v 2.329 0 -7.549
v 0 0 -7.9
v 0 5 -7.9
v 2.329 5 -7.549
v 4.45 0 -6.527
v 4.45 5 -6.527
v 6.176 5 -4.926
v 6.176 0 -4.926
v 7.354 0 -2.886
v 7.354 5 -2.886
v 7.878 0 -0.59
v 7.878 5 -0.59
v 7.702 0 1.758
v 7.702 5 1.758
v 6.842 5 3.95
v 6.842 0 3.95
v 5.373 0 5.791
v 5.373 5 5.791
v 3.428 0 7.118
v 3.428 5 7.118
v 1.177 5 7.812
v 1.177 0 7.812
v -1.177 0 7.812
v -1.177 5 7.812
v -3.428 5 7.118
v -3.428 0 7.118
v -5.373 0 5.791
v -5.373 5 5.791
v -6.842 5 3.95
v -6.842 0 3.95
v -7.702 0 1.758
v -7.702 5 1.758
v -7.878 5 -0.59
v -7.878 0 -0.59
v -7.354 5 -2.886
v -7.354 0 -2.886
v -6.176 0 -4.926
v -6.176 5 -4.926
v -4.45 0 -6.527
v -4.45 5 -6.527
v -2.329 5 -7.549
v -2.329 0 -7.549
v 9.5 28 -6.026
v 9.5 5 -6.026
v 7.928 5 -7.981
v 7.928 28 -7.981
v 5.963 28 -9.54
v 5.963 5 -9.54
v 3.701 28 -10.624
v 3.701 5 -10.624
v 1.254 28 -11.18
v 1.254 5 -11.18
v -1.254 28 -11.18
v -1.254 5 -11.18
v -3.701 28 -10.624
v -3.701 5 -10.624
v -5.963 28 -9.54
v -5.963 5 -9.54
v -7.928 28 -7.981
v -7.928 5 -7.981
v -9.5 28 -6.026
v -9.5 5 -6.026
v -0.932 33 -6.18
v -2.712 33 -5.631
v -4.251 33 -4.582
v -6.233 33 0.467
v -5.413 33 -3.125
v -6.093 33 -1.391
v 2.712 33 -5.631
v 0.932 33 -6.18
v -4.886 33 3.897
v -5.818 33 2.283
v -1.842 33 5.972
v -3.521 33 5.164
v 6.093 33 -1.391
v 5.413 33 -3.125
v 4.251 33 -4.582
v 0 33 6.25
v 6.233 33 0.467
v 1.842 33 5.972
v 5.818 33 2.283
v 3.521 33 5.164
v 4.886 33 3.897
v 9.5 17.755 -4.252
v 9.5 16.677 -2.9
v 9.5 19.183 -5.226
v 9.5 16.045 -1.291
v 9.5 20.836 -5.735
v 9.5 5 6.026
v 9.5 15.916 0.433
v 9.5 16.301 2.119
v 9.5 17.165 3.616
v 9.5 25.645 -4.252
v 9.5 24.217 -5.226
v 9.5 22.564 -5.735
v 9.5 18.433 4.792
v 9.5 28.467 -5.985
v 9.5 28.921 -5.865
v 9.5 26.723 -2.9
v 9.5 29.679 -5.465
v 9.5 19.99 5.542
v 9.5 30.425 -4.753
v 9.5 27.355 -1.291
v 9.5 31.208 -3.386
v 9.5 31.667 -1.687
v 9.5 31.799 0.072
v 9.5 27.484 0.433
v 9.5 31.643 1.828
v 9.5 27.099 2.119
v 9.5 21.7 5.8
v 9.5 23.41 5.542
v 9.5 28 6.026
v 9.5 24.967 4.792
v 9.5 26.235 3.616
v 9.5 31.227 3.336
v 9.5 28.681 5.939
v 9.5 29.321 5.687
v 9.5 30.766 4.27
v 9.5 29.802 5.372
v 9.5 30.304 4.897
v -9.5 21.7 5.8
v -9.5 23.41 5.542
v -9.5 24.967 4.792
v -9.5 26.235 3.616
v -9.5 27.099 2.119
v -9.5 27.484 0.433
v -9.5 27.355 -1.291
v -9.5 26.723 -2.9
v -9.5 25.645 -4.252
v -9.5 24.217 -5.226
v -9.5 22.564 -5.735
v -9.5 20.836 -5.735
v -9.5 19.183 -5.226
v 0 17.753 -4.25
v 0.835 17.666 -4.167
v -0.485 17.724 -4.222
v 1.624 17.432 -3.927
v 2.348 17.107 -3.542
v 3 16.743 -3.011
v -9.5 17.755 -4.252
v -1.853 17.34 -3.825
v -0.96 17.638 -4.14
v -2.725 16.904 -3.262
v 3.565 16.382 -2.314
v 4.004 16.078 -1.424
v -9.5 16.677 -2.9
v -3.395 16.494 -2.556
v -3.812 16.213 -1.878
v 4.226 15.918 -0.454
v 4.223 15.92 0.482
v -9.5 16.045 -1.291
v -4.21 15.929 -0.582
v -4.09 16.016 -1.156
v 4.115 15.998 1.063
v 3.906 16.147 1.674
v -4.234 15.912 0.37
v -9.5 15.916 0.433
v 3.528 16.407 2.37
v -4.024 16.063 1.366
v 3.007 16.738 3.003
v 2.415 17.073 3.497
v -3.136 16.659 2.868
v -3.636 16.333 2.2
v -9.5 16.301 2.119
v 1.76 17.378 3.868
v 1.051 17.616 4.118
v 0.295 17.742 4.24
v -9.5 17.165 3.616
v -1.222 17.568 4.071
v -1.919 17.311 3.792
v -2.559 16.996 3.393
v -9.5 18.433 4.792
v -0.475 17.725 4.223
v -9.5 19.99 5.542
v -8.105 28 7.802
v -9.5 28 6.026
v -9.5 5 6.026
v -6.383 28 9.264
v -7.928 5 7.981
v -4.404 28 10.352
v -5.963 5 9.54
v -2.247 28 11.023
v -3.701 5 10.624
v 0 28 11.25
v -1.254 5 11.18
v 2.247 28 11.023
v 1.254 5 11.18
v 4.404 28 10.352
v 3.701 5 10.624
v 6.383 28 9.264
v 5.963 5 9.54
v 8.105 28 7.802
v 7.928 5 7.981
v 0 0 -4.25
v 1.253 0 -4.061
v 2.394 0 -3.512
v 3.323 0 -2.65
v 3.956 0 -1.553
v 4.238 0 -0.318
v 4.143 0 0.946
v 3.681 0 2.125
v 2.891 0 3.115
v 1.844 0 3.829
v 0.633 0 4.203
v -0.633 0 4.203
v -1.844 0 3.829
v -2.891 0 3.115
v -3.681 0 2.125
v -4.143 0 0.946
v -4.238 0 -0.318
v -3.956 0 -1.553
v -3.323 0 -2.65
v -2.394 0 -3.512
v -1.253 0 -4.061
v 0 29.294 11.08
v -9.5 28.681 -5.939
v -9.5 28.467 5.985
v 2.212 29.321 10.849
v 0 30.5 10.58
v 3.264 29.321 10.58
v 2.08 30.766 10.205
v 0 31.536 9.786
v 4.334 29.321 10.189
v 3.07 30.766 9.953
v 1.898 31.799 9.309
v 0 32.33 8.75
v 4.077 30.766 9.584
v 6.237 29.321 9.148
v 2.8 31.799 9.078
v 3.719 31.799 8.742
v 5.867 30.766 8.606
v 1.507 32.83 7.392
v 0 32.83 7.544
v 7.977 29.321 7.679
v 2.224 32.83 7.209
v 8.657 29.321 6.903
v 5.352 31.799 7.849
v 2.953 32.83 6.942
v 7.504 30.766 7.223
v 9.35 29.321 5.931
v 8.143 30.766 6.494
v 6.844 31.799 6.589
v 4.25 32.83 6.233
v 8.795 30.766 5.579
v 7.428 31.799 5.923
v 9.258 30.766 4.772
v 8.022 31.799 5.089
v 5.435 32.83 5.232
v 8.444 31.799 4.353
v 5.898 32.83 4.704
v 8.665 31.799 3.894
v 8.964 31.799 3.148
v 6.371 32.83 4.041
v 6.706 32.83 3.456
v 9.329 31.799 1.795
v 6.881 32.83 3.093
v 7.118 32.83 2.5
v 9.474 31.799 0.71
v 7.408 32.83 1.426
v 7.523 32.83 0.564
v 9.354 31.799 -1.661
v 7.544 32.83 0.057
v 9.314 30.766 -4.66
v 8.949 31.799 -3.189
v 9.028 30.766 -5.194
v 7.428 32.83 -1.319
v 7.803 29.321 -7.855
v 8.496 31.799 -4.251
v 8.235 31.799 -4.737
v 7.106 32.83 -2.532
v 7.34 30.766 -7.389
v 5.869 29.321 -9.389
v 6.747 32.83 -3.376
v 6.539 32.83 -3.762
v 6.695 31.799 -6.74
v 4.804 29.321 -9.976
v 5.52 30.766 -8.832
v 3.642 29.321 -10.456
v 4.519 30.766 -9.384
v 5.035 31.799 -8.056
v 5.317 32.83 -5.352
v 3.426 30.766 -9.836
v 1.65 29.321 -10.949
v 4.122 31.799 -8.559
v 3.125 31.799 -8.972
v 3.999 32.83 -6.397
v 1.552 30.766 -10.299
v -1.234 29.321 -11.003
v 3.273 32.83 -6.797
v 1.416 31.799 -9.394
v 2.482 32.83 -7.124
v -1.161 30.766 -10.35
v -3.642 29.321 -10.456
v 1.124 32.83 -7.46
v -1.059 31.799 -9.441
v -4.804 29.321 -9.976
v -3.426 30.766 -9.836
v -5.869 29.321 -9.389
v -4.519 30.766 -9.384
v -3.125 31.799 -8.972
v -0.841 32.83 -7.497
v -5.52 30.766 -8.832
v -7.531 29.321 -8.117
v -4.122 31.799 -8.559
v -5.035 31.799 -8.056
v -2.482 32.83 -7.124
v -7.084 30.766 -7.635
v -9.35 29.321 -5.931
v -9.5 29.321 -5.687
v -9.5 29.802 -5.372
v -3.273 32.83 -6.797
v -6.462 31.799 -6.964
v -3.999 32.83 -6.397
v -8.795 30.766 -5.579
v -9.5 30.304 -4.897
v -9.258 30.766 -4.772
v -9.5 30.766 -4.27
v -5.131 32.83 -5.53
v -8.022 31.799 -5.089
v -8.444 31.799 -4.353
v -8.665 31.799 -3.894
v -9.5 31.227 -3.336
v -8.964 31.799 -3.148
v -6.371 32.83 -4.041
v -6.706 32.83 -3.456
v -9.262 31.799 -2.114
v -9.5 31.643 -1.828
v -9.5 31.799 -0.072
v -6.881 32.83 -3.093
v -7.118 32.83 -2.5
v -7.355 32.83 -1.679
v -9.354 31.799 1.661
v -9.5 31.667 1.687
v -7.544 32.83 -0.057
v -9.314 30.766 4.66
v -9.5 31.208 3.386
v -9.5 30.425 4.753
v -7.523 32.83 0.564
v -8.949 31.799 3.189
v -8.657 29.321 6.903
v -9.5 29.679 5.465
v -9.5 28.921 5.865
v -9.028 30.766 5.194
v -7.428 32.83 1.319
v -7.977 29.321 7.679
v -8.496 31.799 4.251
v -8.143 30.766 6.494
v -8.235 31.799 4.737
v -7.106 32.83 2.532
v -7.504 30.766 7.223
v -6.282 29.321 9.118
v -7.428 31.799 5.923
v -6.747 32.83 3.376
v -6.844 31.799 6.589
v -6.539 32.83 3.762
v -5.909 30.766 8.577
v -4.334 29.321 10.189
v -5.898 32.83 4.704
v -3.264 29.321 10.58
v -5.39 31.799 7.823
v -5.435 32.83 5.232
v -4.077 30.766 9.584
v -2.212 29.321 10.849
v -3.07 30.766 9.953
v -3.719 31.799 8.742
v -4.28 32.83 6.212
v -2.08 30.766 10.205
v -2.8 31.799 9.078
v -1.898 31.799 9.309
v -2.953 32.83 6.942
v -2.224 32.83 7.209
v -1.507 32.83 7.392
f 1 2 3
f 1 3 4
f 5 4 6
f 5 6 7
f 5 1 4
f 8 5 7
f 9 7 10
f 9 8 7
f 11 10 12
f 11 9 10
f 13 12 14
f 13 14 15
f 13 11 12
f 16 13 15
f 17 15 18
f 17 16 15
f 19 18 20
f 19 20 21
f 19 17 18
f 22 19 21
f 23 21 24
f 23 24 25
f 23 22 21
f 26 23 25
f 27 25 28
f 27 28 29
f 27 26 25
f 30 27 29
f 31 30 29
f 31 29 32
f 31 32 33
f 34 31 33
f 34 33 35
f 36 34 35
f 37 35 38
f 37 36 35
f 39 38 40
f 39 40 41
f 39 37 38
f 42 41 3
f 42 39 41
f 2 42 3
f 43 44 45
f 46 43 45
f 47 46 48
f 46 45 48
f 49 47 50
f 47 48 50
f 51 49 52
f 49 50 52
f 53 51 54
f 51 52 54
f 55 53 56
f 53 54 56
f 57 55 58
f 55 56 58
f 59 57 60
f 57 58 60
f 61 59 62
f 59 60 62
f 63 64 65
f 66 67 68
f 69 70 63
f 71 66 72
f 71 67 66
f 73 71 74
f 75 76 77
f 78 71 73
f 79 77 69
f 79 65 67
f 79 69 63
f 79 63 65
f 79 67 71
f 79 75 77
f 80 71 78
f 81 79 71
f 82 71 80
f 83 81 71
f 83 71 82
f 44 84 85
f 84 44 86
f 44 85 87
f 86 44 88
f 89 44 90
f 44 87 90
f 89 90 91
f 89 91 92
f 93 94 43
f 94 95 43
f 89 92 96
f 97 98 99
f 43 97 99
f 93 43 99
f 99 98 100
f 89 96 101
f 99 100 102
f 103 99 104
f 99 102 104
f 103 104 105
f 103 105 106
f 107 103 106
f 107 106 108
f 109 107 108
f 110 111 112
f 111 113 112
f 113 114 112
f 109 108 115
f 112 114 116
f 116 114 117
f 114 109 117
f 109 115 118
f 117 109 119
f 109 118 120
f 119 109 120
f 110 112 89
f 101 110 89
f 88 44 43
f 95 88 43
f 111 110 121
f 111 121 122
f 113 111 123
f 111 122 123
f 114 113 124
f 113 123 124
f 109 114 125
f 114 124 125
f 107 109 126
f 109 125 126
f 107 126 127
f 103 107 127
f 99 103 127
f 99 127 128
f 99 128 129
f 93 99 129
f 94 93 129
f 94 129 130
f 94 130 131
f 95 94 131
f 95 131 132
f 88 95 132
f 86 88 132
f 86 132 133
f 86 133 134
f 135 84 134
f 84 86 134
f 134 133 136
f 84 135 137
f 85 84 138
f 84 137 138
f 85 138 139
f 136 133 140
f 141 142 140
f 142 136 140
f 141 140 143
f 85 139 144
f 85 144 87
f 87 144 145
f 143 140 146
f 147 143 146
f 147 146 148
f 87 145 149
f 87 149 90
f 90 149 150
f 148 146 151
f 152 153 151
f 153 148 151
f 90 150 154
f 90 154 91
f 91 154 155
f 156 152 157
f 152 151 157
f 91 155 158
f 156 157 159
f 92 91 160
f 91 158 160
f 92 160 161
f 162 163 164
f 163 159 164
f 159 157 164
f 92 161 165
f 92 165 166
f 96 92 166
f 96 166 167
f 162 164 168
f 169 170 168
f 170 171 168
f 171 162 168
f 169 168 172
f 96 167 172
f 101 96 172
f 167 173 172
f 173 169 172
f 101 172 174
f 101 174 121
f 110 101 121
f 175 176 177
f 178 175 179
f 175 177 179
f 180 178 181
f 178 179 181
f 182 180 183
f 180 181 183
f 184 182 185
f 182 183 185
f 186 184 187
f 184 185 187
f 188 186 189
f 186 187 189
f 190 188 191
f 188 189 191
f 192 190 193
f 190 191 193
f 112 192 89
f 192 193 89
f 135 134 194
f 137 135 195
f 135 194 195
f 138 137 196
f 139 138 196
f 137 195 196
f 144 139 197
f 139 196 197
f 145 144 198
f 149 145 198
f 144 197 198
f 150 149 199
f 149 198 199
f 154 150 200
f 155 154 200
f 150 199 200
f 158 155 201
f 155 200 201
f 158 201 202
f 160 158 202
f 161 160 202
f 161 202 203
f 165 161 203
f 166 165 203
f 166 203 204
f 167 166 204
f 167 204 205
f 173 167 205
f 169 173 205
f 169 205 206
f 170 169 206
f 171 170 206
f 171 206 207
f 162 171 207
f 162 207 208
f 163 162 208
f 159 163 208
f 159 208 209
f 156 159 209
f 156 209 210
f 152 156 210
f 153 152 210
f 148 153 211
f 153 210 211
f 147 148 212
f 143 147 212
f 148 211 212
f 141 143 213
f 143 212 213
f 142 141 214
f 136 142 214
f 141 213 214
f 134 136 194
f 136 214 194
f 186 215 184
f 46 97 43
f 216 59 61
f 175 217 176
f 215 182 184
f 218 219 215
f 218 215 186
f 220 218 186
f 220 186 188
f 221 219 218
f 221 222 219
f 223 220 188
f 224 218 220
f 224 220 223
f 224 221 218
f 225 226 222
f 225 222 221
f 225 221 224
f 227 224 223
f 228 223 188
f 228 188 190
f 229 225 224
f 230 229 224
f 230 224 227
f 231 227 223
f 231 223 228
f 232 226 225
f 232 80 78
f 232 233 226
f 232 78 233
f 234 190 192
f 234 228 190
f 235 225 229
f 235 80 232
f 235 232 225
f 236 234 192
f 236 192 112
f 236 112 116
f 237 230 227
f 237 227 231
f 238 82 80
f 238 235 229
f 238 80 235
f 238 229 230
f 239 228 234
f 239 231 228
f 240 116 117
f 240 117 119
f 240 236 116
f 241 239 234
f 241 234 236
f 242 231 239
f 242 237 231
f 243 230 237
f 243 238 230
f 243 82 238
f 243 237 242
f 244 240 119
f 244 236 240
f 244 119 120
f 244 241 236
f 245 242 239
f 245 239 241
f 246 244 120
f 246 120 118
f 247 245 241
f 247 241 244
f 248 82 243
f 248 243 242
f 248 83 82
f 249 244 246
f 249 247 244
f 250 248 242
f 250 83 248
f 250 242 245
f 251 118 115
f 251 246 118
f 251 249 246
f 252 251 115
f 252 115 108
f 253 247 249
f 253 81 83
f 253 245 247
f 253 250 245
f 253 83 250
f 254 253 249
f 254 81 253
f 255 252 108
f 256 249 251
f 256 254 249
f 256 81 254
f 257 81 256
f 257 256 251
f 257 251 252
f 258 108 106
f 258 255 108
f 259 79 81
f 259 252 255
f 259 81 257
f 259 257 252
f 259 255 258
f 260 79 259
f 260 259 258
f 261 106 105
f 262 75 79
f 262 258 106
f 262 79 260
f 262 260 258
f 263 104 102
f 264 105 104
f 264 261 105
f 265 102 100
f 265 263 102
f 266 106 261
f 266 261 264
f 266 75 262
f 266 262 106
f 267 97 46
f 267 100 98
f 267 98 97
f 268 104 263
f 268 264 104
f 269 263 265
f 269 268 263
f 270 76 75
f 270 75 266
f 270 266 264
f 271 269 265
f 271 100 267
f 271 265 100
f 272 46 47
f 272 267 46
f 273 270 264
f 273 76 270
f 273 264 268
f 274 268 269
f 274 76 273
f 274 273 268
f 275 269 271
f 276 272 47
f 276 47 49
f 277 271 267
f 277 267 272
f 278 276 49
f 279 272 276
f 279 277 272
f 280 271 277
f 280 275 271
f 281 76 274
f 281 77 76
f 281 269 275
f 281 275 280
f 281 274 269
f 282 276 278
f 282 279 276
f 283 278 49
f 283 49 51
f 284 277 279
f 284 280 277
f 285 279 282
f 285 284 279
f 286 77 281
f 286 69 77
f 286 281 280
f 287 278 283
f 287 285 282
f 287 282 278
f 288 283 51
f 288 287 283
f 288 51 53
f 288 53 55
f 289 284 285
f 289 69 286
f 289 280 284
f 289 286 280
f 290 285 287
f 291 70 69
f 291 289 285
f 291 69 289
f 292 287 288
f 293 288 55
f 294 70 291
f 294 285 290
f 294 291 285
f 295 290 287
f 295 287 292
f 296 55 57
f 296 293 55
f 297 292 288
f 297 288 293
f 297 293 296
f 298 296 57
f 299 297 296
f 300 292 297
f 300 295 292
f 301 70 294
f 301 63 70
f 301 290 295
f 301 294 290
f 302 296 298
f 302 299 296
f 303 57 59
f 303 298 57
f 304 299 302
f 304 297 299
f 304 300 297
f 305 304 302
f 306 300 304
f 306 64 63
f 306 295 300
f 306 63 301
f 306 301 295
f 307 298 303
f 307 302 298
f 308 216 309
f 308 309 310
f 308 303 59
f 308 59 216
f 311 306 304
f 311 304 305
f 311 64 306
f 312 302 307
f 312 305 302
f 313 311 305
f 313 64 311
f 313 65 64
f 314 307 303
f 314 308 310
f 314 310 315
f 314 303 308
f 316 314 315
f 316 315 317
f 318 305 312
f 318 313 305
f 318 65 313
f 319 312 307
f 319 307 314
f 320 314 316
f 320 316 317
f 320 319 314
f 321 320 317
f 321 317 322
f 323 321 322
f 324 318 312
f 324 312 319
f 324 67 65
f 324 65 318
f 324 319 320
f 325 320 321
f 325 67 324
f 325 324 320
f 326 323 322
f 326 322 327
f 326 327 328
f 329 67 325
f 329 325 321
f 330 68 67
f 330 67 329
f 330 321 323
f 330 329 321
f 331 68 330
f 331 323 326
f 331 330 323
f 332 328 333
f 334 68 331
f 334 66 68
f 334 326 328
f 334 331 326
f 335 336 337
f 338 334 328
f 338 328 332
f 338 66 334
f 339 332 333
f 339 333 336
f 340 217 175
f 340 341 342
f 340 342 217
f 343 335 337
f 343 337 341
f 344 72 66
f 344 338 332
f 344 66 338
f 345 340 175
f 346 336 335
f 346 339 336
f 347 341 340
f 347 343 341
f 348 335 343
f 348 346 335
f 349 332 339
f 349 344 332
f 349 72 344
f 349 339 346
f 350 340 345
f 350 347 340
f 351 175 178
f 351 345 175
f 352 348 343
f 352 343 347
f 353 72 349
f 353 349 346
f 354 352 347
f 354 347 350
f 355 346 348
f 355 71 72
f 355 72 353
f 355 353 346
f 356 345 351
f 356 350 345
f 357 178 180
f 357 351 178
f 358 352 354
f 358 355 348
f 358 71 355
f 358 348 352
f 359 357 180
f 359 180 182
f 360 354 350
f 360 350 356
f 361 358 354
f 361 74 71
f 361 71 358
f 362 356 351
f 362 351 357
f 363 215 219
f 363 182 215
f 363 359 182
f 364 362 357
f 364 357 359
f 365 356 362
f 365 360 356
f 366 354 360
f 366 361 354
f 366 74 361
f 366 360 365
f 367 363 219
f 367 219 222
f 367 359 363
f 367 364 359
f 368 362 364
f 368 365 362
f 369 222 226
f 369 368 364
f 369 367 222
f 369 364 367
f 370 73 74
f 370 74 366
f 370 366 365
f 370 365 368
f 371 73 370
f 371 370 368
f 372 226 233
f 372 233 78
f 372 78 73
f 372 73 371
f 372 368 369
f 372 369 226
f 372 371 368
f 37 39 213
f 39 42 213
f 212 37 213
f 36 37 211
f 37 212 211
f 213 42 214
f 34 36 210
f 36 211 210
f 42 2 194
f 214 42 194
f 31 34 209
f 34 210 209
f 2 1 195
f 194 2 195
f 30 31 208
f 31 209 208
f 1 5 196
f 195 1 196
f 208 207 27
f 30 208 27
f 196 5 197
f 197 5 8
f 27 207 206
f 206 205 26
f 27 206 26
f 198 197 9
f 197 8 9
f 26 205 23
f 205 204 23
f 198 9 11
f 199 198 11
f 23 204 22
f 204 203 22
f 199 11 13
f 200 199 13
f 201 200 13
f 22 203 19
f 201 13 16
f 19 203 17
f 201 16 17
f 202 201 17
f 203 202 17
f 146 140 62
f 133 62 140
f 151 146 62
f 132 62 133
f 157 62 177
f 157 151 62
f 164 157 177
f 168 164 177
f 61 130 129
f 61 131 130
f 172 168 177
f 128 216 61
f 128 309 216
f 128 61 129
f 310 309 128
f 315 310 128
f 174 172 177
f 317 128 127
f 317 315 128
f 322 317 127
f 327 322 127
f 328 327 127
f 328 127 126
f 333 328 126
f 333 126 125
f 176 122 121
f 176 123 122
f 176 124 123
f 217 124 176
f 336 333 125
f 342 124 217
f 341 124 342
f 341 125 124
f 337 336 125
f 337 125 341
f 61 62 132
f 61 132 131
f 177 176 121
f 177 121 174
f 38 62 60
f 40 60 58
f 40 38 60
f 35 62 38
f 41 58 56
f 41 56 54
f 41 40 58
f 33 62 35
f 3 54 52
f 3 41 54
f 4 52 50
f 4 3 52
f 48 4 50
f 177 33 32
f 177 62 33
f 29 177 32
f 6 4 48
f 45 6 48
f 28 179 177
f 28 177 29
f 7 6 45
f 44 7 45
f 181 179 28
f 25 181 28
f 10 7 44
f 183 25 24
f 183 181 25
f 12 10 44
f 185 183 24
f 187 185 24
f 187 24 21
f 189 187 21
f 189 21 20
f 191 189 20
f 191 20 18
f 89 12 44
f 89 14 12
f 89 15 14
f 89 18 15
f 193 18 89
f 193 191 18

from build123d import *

# Parameters (mm, degrees)
SKETCH1_R               = 11.25
BOSS_EXTRUDE1_DEPTH     = 33
FILLET1_R               = 5
CUT_EXTRUDE1_DEPTH      = 37.635024225
SKETCH3_OUTSIDE_W       = 29.846
SKETCH3_OUTSIDE_H       = 33.346
SKETCH3_OUTSIDE_R       = 7.9
CUT_EXTRUDE2_DEPTH      = 5
SKETCH4_R               = 5.8
CUT_EXTRUDE3_DEPTH      = 40.705950595
CUT_EXTRUDE4_REACH      = 38.136
CUT_EXTRUDE4_END_RADIUS = 5.8
SKETCH5_R               = 4.25


with BuildPart() as part:
    # Sketch1 → Boss-Extrude1 (new body)
    with BuildSketch(Plane(origin=(0, 0, 0), x_dir=(1, 0, 0), z_dir=(0, 1, 0))):
        with Locations(Location((0, 0, 0), (0, 0, 270))):
            Circle(SKETCH1_R)
    extrude(amount=BOSS_EXTRUDE1_DEPTH)

    # Fillet1
    fillet1_edges = [part.edges().sort_by_distance(p)[0] for p in [
        (0, 33, -11.25),
    ]]
    fillet(fillet1_edges, radius=FILLET1_R)

    # Sketch2 → Cut-Extrude1 (cut, through all)
    with BuildSketch(Plane(origin=(0, 33, 0), x_dir=(1, 0, 0), z_dir=(0, 1, 0))):
        with BuildLine():
            Line((-9.5, 6.025985397), (-9.5, -6.025985397))
            ThreePointArc((-9.5, -6.025985397), (-11.25, 0), (-9.5, 6.025985397))
        make_face()
        with BuildLine():
            Line((9.5, 6.025985397), (9.5, -6.025985397))
            ThreePointArc((9.5, -6.025985397), (11.25, 0), (9.5, 6.025985397))
        make_face()
    extrude(amount=-CUT_EXTRUDE1_DEPTH, mode=Mode.SUBTRACT)

    # Sketch3 outside → Cut-Extrude2 (cut)
    with BuildSketch(Plane.XZ):
        Rectangle(SKETCH3_OUTSIDE_W, SKETCH3_OUTSIDE_H)
        with Locations(Location((0, 0, 0), (0, 0, 270))):
            Circle(SKETCH3_OUTSIDE_R, mode=Mode.SUBTRACT)
    extrude(amount=-CUT_EXTRUDE2_DEPTH, mode=Mode.SUBTRACT)

    # Sketch4 → Cut-Extrude3 (cut, through all)
    with BuildSketch(Plane.ZY.offset(9.5)):
        with Locations((0, 21.7)):
            Circle(SKETCH4_R)
    extrude(amount=-CUT_EXTRUDE3_DEPTH, mode=Mode.SUBTRACT)

    # Cut-Extrude4: up to this cylinder (the profile starts outside it)
    cut_extrude4_end = Plane(origin=(0, 21.7, 0), z_dir=(-1, 0, 0)) * Cylinder(CUT_EXTRUDE4_END_RADIUS, 88.872, mode=Mode.PRIVATE)
    # Sketch5 → Cut-Extrude4 (cut, up to the surface)
    with BuildSketch(Plane.XZ, mode=Mode.PRIVATE) as cut_extrude4_sk1:
        with Locations(Location((0, 0, 0), (0, 0, 270))):
            Circle(SKETCH5_R)
    cut_extrude4_tool1 = extrude(cut_extrude4_sk1.sketch, amount=-CUT_EXTRUDE4_REACH, mode=Mode.PRIVATE) - cut_extrude4_end
    add(cut_extrude4_tool1.solids().sort_by_distance((0, 0, 0))[0], mode=Mode.SUBTRACT)


solid = part.part
